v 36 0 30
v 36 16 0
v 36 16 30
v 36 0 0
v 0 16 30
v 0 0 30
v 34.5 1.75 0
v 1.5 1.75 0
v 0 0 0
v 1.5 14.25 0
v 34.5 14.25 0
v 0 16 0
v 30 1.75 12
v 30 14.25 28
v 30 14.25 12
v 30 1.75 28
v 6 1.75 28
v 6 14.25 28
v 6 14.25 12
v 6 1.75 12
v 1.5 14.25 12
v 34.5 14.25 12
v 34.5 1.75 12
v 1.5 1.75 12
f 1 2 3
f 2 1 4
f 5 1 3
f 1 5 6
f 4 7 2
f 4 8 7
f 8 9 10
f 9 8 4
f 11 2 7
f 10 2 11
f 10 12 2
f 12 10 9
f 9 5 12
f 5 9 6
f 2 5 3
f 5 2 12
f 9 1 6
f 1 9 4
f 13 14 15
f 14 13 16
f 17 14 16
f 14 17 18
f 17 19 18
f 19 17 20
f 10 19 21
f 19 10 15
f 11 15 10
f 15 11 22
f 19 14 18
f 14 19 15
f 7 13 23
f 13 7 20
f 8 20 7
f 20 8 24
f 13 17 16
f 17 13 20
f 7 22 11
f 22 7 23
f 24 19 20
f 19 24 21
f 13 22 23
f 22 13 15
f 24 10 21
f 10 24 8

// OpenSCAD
difference() {
    cube([36,16,30]);
    translate([(36-24)/2,(16-12.5)/2, -1]) cube([24,12.5,28 +1]);
    translate([(36-33)/2,(16-12.5)/2, -1]) cube([33,12.5,28-16 +1]);
}

// maybe have it extend down another 5mm just on the sides the servo arm isn't? to cover the arm?
